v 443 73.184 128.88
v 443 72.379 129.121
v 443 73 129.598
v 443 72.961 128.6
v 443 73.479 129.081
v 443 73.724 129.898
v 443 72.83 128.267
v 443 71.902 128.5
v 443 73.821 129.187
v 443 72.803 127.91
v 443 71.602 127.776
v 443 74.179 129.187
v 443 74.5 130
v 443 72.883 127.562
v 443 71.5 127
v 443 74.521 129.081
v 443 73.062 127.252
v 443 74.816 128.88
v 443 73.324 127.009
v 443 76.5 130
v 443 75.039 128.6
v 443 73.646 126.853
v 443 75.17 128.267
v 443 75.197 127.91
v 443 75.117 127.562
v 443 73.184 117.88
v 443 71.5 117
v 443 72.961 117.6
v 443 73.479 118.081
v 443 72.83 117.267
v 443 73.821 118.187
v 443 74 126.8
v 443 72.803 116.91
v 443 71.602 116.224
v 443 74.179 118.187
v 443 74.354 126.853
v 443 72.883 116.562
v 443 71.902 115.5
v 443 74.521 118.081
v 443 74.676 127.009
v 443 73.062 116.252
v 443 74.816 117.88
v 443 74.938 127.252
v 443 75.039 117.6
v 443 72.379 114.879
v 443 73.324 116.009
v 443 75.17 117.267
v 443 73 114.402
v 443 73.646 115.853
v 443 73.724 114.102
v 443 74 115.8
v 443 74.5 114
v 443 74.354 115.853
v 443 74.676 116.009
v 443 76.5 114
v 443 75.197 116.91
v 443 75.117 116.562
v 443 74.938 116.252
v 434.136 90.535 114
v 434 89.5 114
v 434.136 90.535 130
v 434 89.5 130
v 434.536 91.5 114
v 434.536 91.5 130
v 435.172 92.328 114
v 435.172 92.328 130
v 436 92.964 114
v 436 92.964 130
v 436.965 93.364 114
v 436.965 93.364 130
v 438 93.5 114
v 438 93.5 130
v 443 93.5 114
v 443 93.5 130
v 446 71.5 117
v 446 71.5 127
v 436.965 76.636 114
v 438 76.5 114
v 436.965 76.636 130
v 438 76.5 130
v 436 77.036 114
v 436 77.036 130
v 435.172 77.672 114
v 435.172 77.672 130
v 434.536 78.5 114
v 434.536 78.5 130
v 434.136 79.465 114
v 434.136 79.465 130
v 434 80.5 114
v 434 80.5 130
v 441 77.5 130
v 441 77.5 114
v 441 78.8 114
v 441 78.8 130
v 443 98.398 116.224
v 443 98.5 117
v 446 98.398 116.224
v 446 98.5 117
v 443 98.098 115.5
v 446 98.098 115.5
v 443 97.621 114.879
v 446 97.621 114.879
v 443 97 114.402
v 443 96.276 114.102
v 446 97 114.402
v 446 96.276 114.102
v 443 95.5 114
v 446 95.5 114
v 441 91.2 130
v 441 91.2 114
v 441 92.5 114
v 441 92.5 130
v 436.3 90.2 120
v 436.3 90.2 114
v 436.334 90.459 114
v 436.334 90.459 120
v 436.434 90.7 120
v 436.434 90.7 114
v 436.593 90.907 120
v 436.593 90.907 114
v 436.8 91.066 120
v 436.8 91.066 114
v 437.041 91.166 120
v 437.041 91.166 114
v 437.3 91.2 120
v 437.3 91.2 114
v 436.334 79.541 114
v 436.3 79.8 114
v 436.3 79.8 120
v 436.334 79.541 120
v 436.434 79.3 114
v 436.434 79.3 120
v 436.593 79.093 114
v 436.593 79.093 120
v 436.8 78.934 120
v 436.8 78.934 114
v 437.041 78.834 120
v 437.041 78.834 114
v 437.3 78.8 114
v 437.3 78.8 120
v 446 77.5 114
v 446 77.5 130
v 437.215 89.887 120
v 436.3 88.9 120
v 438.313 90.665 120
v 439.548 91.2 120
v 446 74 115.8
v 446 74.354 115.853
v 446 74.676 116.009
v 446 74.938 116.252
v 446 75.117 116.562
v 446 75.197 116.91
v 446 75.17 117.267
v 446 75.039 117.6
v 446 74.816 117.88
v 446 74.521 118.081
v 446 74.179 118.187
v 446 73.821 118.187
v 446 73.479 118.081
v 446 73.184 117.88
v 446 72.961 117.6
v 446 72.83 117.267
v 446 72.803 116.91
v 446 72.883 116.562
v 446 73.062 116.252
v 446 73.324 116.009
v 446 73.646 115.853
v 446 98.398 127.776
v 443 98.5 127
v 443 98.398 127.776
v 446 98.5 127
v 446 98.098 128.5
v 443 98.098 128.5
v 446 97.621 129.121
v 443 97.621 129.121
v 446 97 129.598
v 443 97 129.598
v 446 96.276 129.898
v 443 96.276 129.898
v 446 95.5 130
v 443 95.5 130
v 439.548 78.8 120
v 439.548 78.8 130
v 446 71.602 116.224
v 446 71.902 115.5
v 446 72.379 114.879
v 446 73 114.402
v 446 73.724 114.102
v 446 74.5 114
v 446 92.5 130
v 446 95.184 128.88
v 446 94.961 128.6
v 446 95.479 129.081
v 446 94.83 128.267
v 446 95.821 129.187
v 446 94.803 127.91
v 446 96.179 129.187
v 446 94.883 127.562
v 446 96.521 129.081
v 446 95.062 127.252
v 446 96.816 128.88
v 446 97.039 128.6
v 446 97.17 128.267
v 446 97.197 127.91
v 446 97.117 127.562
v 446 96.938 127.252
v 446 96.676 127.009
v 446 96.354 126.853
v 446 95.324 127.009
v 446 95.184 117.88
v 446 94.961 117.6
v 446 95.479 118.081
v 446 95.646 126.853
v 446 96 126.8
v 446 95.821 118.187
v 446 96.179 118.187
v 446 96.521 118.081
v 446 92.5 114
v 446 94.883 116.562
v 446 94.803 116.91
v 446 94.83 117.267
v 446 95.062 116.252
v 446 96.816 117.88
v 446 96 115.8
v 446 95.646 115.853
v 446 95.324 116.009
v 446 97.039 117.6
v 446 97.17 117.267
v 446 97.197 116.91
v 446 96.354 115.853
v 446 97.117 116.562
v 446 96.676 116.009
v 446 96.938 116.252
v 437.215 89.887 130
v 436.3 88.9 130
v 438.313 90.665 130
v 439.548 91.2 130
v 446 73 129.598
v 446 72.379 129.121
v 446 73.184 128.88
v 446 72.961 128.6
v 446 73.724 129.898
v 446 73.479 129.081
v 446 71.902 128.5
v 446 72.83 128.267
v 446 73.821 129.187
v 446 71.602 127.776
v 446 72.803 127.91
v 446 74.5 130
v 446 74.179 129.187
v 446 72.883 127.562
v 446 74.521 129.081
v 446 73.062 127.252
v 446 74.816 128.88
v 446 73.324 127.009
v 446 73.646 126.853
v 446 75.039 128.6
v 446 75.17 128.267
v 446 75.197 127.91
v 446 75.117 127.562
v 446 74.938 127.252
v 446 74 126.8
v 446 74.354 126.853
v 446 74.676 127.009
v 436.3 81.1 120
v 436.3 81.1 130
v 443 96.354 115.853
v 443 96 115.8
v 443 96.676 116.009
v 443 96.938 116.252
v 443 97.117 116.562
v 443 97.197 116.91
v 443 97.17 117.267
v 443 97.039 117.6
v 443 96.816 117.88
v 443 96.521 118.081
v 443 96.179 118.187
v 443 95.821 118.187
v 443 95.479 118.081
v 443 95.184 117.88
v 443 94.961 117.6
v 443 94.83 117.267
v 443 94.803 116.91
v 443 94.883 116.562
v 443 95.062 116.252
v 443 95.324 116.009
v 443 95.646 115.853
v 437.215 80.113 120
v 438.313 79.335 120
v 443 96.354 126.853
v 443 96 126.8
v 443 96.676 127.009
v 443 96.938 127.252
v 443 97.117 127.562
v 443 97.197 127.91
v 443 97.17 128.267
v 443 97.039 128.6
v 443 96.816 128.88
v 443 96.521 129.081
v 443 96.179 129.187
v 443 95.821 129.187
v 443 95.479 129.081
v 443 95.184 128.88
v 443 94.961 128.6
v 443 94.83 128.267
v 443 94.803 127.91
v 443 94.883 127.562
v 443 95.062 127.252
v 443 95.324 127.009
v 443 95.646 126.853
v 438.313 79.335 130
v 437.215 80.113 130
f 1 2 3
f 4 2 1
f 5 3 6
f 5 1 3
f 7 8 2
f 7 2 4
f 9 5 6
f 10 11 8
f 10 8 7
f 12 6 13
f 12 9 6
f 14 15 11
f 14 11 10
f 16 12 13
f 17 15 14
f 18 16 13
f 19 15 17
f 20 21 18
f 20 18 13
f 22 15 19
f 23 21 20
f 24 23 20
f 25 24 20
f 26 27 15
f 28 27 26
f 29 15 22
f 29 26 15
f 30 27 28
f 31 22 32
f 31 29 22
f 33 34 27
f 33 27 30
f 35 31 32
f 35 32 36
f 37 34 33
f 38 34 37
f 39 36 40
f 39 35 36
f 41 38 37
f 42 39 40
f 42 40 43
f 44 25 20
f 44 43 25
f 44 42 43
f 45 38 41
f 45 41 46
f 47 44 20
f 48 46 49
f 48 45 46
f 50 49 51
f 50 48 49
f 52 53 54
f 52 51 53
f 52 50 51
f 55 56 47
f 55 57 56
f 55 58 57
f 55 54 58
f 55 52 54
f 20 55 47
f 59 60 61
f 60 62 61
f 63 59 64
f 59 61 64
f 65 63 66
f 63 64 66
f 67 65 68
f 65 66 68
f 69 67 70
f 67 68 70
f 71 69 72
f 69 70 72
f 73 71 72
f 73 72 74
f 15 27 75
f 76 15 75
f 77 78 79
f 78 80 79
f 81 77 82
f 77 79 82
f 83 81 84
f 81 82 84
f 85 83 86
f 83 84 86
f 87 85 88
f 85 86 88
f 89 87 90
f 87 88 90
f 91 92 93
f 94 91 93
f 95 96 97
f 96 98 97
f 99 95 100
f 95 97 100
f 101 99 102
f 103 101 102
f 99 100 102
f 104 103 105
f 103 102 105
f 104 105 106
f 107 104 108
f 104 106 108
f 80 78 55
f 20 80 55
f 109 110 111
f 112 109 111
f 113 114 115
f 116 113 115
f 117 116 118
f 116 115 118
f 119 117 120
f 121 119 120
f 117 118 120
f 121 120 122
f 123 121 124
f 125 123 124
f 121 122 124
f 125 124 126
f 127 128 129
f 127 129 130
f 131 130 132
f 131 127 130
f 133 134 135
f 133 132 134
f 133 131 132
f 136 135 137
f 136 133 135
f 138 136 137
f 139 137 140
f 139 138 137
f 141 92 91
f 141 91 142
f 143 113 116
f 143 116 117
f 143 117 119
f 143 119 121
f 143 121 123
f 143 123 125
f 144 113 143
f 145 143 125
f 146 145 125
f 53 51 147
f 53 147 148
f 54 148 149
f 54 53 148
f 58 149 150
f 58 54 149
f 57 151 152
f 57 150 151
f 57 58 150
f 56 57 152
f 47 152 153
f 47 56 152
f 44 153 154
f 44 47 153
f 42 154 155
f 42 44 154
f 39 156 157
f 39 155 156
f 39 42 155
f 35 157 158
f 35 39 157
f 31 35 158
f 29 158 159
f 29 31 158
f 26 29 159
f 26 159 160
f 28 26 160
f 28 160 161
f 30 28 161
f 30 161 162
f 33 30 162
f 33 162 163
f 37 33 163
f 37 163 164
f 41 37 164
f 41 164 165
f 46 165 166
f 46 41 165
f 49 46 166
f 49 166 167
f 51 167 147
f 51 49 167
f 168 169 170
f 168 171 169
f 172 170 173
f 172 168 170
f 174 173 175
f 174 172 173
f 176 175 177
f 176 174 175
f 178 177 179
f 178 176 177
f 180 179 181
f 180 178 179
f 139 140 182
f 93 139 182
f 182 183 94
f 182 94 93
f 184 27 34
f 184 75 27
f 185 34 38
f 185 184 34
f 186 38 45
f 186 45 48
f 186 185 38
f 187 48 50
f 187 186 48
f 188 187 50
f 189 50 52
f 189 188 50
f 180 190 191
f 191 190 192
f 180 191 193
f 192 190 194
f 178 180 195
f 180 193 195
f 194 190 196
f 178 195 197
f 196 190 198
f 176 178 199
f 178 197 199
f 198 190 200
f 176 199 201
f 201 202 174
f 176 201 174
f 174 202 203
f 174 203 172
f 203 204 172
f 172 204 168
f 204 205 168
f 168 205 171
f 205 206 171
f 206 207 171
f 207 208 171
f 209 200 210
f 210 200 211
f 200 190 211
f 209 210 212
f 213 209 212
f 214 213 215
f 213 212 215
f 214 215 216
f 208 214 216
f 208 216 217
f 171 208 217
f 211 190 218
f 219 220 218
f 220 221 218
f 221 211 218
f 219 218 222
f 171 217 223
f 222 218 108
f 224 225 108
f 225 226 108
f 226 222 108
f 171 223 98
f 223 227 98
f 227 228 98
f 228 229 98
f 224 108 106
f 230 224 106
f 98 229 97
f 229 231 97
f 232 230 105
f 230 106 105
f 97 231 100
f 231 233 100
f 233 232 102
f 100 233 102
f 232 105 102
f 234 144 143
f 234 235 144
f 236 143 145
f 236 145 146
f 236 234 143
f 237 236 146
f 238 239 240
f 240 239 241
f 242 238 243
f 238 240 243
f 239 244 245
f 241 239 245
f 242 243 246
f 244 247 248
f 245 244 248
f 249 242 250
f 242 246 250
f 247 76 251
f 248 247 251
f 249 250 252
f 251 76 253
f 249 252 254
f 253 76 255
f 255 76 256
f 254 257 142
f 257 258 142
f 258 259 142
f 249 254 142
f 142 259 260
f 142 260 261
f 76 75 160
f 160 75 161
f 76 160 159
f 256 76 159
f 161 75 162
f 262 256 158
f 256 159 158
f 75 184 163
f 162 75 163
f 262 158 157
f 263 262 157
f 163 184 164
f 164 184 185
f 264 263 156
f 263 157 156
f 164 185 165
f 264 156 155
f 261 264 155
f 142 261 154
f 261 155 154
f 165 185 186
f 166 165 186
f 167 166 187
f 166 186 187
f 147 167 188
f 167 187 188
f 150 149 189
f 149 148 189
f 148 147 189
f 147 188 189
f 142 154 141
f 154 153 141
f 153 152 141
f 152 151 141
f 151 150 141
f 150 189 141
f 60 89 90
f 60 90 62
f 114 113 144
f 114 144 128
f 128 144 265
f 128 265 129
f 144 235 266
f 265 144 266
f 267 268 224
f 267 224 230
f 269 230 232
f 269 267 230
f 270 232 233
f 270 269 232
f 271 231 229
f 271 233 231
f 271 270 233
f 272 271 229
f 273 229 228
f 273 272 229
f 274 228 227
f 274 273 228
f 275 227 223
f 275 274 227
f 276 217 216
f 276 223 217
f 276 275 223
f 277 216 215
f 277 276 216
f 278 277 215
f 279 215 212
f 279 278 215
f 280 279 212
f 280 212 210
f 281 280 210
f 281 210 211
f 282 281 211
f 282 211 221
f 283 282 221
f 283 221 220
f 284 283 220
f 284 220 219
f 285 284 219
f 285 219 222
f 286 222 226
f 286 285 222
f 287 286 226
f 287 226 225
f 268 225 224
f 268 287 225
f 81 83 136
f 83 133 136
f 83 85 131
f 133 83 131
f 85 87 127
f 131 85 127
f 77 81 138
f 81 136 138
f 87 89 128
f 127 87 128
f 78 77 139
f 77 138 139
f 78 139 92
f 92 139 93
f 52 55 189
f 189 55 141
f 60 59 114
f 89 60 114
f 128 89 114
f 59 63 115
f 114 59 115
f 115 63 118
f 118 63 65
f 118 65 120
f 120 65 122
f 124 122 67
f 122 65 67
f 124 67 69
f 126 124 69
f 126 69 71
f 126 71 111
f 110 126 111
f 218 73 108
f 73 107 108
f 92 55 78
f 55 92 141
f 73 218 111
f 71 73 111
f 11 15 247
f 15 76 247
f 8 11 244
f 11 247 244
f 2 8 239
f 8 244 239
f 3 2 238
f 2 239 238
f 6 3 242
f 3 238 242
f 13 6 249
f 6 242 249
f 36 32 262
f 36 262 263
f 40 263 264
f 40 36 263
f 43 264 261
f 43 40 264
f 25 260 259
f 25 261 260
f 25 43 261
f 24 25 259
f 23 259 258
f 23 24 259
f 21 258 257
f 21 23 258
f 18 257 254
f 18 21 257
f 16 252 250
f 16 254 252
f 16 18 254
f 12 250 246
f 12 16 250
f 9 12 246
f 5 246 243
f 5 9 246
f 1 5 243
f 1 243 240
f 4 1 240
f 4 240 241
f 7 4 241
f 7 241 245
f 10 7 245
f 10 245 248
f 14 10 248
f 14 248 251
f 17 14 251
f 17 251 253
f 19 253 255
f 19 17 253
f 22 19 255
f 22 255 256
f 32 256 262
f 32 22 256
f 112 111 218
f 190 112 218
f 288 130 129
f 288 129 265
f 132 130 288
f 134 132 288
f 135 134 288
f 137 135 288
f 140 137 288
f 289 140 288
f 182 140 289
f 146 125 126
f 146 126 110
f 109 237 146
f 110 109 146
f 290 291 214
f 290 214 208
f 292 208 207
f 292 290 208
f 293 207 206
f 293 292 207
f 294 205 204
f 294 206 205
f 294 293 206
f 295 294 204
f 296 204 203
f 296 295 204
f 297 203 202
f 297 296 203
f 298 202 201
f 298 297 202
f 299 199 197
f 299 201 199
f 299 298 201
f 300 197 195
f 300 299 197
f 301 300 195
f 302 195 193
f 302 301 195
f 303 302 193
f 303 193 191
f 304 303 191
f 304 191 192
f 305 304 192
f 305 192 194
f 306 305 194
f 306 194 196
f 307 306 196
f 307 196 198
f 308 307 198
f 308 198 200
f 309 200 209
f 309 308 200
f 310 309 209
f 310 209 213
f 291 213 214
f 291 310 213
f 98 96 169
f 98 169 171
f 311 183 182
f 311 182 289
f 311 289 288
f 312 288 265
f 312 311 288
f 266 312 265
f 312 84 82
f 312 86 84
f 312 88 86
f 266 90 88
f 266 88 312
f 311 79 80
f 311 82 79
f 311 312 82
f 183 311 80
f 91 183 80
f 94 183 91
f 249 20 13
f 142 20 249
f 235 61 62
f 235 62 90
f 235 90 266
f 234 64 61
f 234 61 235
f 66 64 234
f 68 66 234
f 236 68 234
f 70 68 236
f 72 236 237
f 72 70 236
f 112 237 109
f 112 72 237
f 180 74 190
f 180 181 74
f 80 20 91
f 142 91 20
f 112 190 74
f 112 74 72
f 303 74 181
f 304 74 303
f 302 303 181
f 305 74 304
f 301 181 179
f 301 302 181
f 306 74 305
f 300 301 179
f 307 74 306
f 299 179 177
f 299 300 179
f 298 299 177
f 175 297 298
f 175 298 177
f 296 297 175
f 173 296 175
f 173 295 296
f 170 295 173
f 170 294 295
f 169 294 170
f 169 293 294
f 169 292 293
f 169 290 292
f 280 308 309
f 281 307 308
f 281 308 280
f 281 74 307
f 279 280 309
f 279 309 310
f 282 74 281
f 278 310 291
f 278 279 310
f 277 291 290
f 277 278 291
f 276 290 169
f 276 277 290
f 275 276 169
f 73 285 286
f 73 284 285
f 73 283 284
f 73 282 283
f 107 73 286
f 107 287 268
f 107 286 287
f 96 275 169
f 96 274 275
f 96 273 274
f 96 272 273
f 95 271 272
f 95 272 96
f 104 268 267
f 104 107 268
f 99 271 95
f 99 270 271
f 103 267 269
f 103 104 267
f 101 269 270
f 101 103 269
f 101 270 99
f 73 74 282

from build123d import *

# Parameters (mm, degrees)
CYLINDER1313_R            = 1.2
CYLINDER1313_DEPTH        = 11
CYLINDER1314_R            = 1.2
CYLINDER1314_DEPTH        = 11
CYLINDER1223_R            = 1.2
CYLINDER1223_DEPTH        = 11
CYLINDER1224_R            = 1.2
CYLINDER1224_DEPTH        = 11
BOX517_W                  = 10.4
BOX517_H                  = 12.4
BOX517_DEPTH              = 27
FILLET401_R               = 1
CYLINDER1219_R            = 8
CYLINDER1219_DEPTH        = 27
CYLINDER1221_R            = 6.5
CYLINDER1221_DEPTH        = 17
CYLINDER1220_R            = 8
CYLINDER1220_DEPTH        = 17
CYLINDER1222_R            = 8
CYLINDER1222_DEPTH        = 27
CUT014265_PLACEMENT_ANGLE = 180
BOX515_W                  = 6
BOX515_H                  = 15
BOX515_DEPTH              = 21
BOX516_W                  = 3
BOX516_H                  = 27
BOX516_DEPTH              = 16
BOX518_W                  = 12
BOX518_H                  = 17
BOX518_DEPTH              = 16
FILLET406_R               = 3
FILLET407_R               = 4


with BuildPart() as cylinder1313:
    # Cylinder1313 → Cylinder1313 (new body)
    with BuildSketch(Plane(origin=(439, 96, 121), x_dir=(0, 0, -1), z_dir=(1, 0, 0))):
        Circle(CYLINDER1313_R)
    extrude(amount=CYLINDER1313_DEPTH)


with BuildPart() as fusion248002050188:
    # Cylinder1314 → Cylinder1314 (new body)
    with BuildSketch(Plane(origin=(439, 74, 121), x_dir=(0, 0, -1), z_dir=(1, 0, 0))):
        Circle(CYLINDER1314_R)
    extrude(amount=CYLINDER1314_DEPTH)

    # Fusion248002050188: union Cylinder1313
    add(cylinder1313.part)


with BuildPart() as fusion248002050188_1:
    # Fusion248002050188 placement: moved
    add(fusion248002050188.part.moved(Location((0, 0, 7))))


with BuildPart() as cylinder1223:
    # Cylinder1223 → Cylinder1223 (new body)
    with BuildSketch(Plane(origin=(439, 96, 121), x_dir=(0, 0, -1), z_dir=(1, 0, 0))):
        Circle(CYLINDER1223_R)
    extrude(amount=CYLINDER1223_DEPTH)


with BuildPart() as fusion248002050134:
    # Cylinder1224 → Cylinder1224 (new body)
    with BuildSketch(Plane(origin=(439, 74, 121), x_dir=(0, 0, -1), z_dir=(1, 0, 0))):
        Circle(CYLINDER1224_R)
    extrude(amount=CYLINDER1224_DEPTH)

    # Fusion248002050134: union Cylinder1223
    add(cylinder1223.part)


with BuildPart() as fusion248002050134_1:
    # Fusion248002050134 placement: moved
    add(fusion248002050134.part.moved(Location((0, 0, -4))))


with BuildPart() as fillet401:
    # Box517 → Box517 (new body)
    with BuildSketch(Plane(origin=(-5.2, -6.2, 0), x_dir=(1, 0, 0), z_dir=(0, 0, 1))):
        with Locations((5.2, 6.2)):
            Rectangle(BOX517_W, BOX517_H)
    extrude(amount=BOX517_DEPTH)

    # Fillet401
    fillet401_edges = [fillet401.edges().sort_by_distance(p)[0] for p in [
        (-5.2, -6.2, 13.5),
        (-5.2, 6.2, 13.5),
        (5.2, -6.2, 13.5),
        (5.2, 6.2, 13.5),
    ]]
    fillet(fillet401_edges, radius=FILLET401_R)


with BuildPart() as cut014264:
    # Cylinder1219 → Cylinder1219 (new body)
    with BuildSketch(Plane.XY):
        Circle(CYLINDER1219_R)
    extrude(amount=CYLINDER1219_DEPTH)

    # Cut014264: cut Fillet401
    add(fillet401.part, mode=Mode.SUBTRACT)


with BuildPart() as cylinder1425:
    # Cylinder1221 → Cylinder1221 (new body)
    with BuildSketch(Plane.XY):
        Circle(CYLINDER1221_R)
    extrude(amount=CYLINDER1221_DEPTH)


with BuildPart() as fusion248002050131:
    # Cylinder1220 → Cylinder1220 (new body)
    with BuildSketch(Plane.XY):
        Circle(CYLINDER1220_R)
    extrude(amount=CYLINDER1220_DEPTH)

    # Cut014263: cut Cylinder1425
    add(cylinder1425.part, mode=Mode.SUBTRACT)

    # Fusion248002050131: union Cut014264
    add(cut014264.part)


with BuildPart() as bucket_opening_motor002:
    # Cylinder1222 → Cylinder1222 (new body)
    with BuildSketch(Plane.XY):
        Circle(CYLINDER1222_R)
    extrude(amount=CYLINDER1222_DEPTH)

    # Cut014265: cut Fusion248002050131
    add(fusion248002050131.part, mode=Mode.SUBTRACT)


with BuildPart() as bucket_opening_motor002_1:
    # Cut014265 placement: moved
    add(bucket_opening_motor002.part.moved(Location((441.5, 85, 137))).rotate(Axis((441.5, 85, 137), (1, 0, 0)), CUT014265_PLACEMENT_ANGLE))


with BuildPart() as fusion248002050132:
    # Box515 → Box515 (new body)
    with BuildSketch(Plane(origin=(441, 77.5, 109), x_dir=(1, 0, 0), z_dir=(0, 0, 1))):
        with Locations((3, 7.5)):
            Rectangle(BOX515_W, BOX515_H)
    extrude(amount=BOX515_DEPTH)

    # Fusion248002050132: union bucket-opening-motor002
    add(bucket_opening_motor002_1.part)


with BuildPart() as cube742:
    # Box516 → Box516 (new body)
    with BuildSketch(Plane(origin=(443, 71.5, 114), x_dir=(1, 0, 0), z_dir=(0, 0, 1))):
        with Locations((1.5, 13.5)):
            Rectangle(BOX516_W, BOX516_H)
    extrude(amount=BOX516_DEPTH)


with BuildPart() as bucket_opening_motor_holder:
    # Box518 → Box518 (new body)
    with BuildSketch(Plane(origin=(434, 76.5, 114), x_dir=(1, 0, 0), z_dir=(0, 0, 1))):
        with Locations((6, 8.5)):
            Rectangle(BOX518_W, BOX518_H)
    extrude(amount=BOX518_DEPTH)

    # Fusion248002050162: union Cube742
    add(cube742.part)

    # Fillet406
    fillet406_edges = [bucket_opening_motor_holder.edges().sort_by_distance(p)[0] for p in [
        (444.5, 71.5, 114),
        (444.5, 71.5, 130),
        (444.5, 98.5, 114),
        (444.5, 98.5, 130),
    ]]
    fillet(fillet406_edges, radius=FILLET406_R)

    # Fillet407
    fillet407_edges = [bucket_opening_motor_holder.edges().sort_by_distance(p)[0] for p in [
        (434, 76.5, 122),
        (434, 93.5, 122),
    ]]
    fillet(fillet407_edges, radius=FILLET407_R)

    # Cut014290: cut Fusion248002050132
    add(fusion248002050132.part, mode=Mode.SUBTRACT)

    # Cut014291: cut Fusion248002050134
    add(fusion248002050134_1.part, mode=Mode.SUBTRACT)

    # Cut014317: cut Fusion248002050188
    add(fusion248002050188_1.part, mode=Mode.SUBTRACT)


solid = bucket_opening_motor_holder.part
